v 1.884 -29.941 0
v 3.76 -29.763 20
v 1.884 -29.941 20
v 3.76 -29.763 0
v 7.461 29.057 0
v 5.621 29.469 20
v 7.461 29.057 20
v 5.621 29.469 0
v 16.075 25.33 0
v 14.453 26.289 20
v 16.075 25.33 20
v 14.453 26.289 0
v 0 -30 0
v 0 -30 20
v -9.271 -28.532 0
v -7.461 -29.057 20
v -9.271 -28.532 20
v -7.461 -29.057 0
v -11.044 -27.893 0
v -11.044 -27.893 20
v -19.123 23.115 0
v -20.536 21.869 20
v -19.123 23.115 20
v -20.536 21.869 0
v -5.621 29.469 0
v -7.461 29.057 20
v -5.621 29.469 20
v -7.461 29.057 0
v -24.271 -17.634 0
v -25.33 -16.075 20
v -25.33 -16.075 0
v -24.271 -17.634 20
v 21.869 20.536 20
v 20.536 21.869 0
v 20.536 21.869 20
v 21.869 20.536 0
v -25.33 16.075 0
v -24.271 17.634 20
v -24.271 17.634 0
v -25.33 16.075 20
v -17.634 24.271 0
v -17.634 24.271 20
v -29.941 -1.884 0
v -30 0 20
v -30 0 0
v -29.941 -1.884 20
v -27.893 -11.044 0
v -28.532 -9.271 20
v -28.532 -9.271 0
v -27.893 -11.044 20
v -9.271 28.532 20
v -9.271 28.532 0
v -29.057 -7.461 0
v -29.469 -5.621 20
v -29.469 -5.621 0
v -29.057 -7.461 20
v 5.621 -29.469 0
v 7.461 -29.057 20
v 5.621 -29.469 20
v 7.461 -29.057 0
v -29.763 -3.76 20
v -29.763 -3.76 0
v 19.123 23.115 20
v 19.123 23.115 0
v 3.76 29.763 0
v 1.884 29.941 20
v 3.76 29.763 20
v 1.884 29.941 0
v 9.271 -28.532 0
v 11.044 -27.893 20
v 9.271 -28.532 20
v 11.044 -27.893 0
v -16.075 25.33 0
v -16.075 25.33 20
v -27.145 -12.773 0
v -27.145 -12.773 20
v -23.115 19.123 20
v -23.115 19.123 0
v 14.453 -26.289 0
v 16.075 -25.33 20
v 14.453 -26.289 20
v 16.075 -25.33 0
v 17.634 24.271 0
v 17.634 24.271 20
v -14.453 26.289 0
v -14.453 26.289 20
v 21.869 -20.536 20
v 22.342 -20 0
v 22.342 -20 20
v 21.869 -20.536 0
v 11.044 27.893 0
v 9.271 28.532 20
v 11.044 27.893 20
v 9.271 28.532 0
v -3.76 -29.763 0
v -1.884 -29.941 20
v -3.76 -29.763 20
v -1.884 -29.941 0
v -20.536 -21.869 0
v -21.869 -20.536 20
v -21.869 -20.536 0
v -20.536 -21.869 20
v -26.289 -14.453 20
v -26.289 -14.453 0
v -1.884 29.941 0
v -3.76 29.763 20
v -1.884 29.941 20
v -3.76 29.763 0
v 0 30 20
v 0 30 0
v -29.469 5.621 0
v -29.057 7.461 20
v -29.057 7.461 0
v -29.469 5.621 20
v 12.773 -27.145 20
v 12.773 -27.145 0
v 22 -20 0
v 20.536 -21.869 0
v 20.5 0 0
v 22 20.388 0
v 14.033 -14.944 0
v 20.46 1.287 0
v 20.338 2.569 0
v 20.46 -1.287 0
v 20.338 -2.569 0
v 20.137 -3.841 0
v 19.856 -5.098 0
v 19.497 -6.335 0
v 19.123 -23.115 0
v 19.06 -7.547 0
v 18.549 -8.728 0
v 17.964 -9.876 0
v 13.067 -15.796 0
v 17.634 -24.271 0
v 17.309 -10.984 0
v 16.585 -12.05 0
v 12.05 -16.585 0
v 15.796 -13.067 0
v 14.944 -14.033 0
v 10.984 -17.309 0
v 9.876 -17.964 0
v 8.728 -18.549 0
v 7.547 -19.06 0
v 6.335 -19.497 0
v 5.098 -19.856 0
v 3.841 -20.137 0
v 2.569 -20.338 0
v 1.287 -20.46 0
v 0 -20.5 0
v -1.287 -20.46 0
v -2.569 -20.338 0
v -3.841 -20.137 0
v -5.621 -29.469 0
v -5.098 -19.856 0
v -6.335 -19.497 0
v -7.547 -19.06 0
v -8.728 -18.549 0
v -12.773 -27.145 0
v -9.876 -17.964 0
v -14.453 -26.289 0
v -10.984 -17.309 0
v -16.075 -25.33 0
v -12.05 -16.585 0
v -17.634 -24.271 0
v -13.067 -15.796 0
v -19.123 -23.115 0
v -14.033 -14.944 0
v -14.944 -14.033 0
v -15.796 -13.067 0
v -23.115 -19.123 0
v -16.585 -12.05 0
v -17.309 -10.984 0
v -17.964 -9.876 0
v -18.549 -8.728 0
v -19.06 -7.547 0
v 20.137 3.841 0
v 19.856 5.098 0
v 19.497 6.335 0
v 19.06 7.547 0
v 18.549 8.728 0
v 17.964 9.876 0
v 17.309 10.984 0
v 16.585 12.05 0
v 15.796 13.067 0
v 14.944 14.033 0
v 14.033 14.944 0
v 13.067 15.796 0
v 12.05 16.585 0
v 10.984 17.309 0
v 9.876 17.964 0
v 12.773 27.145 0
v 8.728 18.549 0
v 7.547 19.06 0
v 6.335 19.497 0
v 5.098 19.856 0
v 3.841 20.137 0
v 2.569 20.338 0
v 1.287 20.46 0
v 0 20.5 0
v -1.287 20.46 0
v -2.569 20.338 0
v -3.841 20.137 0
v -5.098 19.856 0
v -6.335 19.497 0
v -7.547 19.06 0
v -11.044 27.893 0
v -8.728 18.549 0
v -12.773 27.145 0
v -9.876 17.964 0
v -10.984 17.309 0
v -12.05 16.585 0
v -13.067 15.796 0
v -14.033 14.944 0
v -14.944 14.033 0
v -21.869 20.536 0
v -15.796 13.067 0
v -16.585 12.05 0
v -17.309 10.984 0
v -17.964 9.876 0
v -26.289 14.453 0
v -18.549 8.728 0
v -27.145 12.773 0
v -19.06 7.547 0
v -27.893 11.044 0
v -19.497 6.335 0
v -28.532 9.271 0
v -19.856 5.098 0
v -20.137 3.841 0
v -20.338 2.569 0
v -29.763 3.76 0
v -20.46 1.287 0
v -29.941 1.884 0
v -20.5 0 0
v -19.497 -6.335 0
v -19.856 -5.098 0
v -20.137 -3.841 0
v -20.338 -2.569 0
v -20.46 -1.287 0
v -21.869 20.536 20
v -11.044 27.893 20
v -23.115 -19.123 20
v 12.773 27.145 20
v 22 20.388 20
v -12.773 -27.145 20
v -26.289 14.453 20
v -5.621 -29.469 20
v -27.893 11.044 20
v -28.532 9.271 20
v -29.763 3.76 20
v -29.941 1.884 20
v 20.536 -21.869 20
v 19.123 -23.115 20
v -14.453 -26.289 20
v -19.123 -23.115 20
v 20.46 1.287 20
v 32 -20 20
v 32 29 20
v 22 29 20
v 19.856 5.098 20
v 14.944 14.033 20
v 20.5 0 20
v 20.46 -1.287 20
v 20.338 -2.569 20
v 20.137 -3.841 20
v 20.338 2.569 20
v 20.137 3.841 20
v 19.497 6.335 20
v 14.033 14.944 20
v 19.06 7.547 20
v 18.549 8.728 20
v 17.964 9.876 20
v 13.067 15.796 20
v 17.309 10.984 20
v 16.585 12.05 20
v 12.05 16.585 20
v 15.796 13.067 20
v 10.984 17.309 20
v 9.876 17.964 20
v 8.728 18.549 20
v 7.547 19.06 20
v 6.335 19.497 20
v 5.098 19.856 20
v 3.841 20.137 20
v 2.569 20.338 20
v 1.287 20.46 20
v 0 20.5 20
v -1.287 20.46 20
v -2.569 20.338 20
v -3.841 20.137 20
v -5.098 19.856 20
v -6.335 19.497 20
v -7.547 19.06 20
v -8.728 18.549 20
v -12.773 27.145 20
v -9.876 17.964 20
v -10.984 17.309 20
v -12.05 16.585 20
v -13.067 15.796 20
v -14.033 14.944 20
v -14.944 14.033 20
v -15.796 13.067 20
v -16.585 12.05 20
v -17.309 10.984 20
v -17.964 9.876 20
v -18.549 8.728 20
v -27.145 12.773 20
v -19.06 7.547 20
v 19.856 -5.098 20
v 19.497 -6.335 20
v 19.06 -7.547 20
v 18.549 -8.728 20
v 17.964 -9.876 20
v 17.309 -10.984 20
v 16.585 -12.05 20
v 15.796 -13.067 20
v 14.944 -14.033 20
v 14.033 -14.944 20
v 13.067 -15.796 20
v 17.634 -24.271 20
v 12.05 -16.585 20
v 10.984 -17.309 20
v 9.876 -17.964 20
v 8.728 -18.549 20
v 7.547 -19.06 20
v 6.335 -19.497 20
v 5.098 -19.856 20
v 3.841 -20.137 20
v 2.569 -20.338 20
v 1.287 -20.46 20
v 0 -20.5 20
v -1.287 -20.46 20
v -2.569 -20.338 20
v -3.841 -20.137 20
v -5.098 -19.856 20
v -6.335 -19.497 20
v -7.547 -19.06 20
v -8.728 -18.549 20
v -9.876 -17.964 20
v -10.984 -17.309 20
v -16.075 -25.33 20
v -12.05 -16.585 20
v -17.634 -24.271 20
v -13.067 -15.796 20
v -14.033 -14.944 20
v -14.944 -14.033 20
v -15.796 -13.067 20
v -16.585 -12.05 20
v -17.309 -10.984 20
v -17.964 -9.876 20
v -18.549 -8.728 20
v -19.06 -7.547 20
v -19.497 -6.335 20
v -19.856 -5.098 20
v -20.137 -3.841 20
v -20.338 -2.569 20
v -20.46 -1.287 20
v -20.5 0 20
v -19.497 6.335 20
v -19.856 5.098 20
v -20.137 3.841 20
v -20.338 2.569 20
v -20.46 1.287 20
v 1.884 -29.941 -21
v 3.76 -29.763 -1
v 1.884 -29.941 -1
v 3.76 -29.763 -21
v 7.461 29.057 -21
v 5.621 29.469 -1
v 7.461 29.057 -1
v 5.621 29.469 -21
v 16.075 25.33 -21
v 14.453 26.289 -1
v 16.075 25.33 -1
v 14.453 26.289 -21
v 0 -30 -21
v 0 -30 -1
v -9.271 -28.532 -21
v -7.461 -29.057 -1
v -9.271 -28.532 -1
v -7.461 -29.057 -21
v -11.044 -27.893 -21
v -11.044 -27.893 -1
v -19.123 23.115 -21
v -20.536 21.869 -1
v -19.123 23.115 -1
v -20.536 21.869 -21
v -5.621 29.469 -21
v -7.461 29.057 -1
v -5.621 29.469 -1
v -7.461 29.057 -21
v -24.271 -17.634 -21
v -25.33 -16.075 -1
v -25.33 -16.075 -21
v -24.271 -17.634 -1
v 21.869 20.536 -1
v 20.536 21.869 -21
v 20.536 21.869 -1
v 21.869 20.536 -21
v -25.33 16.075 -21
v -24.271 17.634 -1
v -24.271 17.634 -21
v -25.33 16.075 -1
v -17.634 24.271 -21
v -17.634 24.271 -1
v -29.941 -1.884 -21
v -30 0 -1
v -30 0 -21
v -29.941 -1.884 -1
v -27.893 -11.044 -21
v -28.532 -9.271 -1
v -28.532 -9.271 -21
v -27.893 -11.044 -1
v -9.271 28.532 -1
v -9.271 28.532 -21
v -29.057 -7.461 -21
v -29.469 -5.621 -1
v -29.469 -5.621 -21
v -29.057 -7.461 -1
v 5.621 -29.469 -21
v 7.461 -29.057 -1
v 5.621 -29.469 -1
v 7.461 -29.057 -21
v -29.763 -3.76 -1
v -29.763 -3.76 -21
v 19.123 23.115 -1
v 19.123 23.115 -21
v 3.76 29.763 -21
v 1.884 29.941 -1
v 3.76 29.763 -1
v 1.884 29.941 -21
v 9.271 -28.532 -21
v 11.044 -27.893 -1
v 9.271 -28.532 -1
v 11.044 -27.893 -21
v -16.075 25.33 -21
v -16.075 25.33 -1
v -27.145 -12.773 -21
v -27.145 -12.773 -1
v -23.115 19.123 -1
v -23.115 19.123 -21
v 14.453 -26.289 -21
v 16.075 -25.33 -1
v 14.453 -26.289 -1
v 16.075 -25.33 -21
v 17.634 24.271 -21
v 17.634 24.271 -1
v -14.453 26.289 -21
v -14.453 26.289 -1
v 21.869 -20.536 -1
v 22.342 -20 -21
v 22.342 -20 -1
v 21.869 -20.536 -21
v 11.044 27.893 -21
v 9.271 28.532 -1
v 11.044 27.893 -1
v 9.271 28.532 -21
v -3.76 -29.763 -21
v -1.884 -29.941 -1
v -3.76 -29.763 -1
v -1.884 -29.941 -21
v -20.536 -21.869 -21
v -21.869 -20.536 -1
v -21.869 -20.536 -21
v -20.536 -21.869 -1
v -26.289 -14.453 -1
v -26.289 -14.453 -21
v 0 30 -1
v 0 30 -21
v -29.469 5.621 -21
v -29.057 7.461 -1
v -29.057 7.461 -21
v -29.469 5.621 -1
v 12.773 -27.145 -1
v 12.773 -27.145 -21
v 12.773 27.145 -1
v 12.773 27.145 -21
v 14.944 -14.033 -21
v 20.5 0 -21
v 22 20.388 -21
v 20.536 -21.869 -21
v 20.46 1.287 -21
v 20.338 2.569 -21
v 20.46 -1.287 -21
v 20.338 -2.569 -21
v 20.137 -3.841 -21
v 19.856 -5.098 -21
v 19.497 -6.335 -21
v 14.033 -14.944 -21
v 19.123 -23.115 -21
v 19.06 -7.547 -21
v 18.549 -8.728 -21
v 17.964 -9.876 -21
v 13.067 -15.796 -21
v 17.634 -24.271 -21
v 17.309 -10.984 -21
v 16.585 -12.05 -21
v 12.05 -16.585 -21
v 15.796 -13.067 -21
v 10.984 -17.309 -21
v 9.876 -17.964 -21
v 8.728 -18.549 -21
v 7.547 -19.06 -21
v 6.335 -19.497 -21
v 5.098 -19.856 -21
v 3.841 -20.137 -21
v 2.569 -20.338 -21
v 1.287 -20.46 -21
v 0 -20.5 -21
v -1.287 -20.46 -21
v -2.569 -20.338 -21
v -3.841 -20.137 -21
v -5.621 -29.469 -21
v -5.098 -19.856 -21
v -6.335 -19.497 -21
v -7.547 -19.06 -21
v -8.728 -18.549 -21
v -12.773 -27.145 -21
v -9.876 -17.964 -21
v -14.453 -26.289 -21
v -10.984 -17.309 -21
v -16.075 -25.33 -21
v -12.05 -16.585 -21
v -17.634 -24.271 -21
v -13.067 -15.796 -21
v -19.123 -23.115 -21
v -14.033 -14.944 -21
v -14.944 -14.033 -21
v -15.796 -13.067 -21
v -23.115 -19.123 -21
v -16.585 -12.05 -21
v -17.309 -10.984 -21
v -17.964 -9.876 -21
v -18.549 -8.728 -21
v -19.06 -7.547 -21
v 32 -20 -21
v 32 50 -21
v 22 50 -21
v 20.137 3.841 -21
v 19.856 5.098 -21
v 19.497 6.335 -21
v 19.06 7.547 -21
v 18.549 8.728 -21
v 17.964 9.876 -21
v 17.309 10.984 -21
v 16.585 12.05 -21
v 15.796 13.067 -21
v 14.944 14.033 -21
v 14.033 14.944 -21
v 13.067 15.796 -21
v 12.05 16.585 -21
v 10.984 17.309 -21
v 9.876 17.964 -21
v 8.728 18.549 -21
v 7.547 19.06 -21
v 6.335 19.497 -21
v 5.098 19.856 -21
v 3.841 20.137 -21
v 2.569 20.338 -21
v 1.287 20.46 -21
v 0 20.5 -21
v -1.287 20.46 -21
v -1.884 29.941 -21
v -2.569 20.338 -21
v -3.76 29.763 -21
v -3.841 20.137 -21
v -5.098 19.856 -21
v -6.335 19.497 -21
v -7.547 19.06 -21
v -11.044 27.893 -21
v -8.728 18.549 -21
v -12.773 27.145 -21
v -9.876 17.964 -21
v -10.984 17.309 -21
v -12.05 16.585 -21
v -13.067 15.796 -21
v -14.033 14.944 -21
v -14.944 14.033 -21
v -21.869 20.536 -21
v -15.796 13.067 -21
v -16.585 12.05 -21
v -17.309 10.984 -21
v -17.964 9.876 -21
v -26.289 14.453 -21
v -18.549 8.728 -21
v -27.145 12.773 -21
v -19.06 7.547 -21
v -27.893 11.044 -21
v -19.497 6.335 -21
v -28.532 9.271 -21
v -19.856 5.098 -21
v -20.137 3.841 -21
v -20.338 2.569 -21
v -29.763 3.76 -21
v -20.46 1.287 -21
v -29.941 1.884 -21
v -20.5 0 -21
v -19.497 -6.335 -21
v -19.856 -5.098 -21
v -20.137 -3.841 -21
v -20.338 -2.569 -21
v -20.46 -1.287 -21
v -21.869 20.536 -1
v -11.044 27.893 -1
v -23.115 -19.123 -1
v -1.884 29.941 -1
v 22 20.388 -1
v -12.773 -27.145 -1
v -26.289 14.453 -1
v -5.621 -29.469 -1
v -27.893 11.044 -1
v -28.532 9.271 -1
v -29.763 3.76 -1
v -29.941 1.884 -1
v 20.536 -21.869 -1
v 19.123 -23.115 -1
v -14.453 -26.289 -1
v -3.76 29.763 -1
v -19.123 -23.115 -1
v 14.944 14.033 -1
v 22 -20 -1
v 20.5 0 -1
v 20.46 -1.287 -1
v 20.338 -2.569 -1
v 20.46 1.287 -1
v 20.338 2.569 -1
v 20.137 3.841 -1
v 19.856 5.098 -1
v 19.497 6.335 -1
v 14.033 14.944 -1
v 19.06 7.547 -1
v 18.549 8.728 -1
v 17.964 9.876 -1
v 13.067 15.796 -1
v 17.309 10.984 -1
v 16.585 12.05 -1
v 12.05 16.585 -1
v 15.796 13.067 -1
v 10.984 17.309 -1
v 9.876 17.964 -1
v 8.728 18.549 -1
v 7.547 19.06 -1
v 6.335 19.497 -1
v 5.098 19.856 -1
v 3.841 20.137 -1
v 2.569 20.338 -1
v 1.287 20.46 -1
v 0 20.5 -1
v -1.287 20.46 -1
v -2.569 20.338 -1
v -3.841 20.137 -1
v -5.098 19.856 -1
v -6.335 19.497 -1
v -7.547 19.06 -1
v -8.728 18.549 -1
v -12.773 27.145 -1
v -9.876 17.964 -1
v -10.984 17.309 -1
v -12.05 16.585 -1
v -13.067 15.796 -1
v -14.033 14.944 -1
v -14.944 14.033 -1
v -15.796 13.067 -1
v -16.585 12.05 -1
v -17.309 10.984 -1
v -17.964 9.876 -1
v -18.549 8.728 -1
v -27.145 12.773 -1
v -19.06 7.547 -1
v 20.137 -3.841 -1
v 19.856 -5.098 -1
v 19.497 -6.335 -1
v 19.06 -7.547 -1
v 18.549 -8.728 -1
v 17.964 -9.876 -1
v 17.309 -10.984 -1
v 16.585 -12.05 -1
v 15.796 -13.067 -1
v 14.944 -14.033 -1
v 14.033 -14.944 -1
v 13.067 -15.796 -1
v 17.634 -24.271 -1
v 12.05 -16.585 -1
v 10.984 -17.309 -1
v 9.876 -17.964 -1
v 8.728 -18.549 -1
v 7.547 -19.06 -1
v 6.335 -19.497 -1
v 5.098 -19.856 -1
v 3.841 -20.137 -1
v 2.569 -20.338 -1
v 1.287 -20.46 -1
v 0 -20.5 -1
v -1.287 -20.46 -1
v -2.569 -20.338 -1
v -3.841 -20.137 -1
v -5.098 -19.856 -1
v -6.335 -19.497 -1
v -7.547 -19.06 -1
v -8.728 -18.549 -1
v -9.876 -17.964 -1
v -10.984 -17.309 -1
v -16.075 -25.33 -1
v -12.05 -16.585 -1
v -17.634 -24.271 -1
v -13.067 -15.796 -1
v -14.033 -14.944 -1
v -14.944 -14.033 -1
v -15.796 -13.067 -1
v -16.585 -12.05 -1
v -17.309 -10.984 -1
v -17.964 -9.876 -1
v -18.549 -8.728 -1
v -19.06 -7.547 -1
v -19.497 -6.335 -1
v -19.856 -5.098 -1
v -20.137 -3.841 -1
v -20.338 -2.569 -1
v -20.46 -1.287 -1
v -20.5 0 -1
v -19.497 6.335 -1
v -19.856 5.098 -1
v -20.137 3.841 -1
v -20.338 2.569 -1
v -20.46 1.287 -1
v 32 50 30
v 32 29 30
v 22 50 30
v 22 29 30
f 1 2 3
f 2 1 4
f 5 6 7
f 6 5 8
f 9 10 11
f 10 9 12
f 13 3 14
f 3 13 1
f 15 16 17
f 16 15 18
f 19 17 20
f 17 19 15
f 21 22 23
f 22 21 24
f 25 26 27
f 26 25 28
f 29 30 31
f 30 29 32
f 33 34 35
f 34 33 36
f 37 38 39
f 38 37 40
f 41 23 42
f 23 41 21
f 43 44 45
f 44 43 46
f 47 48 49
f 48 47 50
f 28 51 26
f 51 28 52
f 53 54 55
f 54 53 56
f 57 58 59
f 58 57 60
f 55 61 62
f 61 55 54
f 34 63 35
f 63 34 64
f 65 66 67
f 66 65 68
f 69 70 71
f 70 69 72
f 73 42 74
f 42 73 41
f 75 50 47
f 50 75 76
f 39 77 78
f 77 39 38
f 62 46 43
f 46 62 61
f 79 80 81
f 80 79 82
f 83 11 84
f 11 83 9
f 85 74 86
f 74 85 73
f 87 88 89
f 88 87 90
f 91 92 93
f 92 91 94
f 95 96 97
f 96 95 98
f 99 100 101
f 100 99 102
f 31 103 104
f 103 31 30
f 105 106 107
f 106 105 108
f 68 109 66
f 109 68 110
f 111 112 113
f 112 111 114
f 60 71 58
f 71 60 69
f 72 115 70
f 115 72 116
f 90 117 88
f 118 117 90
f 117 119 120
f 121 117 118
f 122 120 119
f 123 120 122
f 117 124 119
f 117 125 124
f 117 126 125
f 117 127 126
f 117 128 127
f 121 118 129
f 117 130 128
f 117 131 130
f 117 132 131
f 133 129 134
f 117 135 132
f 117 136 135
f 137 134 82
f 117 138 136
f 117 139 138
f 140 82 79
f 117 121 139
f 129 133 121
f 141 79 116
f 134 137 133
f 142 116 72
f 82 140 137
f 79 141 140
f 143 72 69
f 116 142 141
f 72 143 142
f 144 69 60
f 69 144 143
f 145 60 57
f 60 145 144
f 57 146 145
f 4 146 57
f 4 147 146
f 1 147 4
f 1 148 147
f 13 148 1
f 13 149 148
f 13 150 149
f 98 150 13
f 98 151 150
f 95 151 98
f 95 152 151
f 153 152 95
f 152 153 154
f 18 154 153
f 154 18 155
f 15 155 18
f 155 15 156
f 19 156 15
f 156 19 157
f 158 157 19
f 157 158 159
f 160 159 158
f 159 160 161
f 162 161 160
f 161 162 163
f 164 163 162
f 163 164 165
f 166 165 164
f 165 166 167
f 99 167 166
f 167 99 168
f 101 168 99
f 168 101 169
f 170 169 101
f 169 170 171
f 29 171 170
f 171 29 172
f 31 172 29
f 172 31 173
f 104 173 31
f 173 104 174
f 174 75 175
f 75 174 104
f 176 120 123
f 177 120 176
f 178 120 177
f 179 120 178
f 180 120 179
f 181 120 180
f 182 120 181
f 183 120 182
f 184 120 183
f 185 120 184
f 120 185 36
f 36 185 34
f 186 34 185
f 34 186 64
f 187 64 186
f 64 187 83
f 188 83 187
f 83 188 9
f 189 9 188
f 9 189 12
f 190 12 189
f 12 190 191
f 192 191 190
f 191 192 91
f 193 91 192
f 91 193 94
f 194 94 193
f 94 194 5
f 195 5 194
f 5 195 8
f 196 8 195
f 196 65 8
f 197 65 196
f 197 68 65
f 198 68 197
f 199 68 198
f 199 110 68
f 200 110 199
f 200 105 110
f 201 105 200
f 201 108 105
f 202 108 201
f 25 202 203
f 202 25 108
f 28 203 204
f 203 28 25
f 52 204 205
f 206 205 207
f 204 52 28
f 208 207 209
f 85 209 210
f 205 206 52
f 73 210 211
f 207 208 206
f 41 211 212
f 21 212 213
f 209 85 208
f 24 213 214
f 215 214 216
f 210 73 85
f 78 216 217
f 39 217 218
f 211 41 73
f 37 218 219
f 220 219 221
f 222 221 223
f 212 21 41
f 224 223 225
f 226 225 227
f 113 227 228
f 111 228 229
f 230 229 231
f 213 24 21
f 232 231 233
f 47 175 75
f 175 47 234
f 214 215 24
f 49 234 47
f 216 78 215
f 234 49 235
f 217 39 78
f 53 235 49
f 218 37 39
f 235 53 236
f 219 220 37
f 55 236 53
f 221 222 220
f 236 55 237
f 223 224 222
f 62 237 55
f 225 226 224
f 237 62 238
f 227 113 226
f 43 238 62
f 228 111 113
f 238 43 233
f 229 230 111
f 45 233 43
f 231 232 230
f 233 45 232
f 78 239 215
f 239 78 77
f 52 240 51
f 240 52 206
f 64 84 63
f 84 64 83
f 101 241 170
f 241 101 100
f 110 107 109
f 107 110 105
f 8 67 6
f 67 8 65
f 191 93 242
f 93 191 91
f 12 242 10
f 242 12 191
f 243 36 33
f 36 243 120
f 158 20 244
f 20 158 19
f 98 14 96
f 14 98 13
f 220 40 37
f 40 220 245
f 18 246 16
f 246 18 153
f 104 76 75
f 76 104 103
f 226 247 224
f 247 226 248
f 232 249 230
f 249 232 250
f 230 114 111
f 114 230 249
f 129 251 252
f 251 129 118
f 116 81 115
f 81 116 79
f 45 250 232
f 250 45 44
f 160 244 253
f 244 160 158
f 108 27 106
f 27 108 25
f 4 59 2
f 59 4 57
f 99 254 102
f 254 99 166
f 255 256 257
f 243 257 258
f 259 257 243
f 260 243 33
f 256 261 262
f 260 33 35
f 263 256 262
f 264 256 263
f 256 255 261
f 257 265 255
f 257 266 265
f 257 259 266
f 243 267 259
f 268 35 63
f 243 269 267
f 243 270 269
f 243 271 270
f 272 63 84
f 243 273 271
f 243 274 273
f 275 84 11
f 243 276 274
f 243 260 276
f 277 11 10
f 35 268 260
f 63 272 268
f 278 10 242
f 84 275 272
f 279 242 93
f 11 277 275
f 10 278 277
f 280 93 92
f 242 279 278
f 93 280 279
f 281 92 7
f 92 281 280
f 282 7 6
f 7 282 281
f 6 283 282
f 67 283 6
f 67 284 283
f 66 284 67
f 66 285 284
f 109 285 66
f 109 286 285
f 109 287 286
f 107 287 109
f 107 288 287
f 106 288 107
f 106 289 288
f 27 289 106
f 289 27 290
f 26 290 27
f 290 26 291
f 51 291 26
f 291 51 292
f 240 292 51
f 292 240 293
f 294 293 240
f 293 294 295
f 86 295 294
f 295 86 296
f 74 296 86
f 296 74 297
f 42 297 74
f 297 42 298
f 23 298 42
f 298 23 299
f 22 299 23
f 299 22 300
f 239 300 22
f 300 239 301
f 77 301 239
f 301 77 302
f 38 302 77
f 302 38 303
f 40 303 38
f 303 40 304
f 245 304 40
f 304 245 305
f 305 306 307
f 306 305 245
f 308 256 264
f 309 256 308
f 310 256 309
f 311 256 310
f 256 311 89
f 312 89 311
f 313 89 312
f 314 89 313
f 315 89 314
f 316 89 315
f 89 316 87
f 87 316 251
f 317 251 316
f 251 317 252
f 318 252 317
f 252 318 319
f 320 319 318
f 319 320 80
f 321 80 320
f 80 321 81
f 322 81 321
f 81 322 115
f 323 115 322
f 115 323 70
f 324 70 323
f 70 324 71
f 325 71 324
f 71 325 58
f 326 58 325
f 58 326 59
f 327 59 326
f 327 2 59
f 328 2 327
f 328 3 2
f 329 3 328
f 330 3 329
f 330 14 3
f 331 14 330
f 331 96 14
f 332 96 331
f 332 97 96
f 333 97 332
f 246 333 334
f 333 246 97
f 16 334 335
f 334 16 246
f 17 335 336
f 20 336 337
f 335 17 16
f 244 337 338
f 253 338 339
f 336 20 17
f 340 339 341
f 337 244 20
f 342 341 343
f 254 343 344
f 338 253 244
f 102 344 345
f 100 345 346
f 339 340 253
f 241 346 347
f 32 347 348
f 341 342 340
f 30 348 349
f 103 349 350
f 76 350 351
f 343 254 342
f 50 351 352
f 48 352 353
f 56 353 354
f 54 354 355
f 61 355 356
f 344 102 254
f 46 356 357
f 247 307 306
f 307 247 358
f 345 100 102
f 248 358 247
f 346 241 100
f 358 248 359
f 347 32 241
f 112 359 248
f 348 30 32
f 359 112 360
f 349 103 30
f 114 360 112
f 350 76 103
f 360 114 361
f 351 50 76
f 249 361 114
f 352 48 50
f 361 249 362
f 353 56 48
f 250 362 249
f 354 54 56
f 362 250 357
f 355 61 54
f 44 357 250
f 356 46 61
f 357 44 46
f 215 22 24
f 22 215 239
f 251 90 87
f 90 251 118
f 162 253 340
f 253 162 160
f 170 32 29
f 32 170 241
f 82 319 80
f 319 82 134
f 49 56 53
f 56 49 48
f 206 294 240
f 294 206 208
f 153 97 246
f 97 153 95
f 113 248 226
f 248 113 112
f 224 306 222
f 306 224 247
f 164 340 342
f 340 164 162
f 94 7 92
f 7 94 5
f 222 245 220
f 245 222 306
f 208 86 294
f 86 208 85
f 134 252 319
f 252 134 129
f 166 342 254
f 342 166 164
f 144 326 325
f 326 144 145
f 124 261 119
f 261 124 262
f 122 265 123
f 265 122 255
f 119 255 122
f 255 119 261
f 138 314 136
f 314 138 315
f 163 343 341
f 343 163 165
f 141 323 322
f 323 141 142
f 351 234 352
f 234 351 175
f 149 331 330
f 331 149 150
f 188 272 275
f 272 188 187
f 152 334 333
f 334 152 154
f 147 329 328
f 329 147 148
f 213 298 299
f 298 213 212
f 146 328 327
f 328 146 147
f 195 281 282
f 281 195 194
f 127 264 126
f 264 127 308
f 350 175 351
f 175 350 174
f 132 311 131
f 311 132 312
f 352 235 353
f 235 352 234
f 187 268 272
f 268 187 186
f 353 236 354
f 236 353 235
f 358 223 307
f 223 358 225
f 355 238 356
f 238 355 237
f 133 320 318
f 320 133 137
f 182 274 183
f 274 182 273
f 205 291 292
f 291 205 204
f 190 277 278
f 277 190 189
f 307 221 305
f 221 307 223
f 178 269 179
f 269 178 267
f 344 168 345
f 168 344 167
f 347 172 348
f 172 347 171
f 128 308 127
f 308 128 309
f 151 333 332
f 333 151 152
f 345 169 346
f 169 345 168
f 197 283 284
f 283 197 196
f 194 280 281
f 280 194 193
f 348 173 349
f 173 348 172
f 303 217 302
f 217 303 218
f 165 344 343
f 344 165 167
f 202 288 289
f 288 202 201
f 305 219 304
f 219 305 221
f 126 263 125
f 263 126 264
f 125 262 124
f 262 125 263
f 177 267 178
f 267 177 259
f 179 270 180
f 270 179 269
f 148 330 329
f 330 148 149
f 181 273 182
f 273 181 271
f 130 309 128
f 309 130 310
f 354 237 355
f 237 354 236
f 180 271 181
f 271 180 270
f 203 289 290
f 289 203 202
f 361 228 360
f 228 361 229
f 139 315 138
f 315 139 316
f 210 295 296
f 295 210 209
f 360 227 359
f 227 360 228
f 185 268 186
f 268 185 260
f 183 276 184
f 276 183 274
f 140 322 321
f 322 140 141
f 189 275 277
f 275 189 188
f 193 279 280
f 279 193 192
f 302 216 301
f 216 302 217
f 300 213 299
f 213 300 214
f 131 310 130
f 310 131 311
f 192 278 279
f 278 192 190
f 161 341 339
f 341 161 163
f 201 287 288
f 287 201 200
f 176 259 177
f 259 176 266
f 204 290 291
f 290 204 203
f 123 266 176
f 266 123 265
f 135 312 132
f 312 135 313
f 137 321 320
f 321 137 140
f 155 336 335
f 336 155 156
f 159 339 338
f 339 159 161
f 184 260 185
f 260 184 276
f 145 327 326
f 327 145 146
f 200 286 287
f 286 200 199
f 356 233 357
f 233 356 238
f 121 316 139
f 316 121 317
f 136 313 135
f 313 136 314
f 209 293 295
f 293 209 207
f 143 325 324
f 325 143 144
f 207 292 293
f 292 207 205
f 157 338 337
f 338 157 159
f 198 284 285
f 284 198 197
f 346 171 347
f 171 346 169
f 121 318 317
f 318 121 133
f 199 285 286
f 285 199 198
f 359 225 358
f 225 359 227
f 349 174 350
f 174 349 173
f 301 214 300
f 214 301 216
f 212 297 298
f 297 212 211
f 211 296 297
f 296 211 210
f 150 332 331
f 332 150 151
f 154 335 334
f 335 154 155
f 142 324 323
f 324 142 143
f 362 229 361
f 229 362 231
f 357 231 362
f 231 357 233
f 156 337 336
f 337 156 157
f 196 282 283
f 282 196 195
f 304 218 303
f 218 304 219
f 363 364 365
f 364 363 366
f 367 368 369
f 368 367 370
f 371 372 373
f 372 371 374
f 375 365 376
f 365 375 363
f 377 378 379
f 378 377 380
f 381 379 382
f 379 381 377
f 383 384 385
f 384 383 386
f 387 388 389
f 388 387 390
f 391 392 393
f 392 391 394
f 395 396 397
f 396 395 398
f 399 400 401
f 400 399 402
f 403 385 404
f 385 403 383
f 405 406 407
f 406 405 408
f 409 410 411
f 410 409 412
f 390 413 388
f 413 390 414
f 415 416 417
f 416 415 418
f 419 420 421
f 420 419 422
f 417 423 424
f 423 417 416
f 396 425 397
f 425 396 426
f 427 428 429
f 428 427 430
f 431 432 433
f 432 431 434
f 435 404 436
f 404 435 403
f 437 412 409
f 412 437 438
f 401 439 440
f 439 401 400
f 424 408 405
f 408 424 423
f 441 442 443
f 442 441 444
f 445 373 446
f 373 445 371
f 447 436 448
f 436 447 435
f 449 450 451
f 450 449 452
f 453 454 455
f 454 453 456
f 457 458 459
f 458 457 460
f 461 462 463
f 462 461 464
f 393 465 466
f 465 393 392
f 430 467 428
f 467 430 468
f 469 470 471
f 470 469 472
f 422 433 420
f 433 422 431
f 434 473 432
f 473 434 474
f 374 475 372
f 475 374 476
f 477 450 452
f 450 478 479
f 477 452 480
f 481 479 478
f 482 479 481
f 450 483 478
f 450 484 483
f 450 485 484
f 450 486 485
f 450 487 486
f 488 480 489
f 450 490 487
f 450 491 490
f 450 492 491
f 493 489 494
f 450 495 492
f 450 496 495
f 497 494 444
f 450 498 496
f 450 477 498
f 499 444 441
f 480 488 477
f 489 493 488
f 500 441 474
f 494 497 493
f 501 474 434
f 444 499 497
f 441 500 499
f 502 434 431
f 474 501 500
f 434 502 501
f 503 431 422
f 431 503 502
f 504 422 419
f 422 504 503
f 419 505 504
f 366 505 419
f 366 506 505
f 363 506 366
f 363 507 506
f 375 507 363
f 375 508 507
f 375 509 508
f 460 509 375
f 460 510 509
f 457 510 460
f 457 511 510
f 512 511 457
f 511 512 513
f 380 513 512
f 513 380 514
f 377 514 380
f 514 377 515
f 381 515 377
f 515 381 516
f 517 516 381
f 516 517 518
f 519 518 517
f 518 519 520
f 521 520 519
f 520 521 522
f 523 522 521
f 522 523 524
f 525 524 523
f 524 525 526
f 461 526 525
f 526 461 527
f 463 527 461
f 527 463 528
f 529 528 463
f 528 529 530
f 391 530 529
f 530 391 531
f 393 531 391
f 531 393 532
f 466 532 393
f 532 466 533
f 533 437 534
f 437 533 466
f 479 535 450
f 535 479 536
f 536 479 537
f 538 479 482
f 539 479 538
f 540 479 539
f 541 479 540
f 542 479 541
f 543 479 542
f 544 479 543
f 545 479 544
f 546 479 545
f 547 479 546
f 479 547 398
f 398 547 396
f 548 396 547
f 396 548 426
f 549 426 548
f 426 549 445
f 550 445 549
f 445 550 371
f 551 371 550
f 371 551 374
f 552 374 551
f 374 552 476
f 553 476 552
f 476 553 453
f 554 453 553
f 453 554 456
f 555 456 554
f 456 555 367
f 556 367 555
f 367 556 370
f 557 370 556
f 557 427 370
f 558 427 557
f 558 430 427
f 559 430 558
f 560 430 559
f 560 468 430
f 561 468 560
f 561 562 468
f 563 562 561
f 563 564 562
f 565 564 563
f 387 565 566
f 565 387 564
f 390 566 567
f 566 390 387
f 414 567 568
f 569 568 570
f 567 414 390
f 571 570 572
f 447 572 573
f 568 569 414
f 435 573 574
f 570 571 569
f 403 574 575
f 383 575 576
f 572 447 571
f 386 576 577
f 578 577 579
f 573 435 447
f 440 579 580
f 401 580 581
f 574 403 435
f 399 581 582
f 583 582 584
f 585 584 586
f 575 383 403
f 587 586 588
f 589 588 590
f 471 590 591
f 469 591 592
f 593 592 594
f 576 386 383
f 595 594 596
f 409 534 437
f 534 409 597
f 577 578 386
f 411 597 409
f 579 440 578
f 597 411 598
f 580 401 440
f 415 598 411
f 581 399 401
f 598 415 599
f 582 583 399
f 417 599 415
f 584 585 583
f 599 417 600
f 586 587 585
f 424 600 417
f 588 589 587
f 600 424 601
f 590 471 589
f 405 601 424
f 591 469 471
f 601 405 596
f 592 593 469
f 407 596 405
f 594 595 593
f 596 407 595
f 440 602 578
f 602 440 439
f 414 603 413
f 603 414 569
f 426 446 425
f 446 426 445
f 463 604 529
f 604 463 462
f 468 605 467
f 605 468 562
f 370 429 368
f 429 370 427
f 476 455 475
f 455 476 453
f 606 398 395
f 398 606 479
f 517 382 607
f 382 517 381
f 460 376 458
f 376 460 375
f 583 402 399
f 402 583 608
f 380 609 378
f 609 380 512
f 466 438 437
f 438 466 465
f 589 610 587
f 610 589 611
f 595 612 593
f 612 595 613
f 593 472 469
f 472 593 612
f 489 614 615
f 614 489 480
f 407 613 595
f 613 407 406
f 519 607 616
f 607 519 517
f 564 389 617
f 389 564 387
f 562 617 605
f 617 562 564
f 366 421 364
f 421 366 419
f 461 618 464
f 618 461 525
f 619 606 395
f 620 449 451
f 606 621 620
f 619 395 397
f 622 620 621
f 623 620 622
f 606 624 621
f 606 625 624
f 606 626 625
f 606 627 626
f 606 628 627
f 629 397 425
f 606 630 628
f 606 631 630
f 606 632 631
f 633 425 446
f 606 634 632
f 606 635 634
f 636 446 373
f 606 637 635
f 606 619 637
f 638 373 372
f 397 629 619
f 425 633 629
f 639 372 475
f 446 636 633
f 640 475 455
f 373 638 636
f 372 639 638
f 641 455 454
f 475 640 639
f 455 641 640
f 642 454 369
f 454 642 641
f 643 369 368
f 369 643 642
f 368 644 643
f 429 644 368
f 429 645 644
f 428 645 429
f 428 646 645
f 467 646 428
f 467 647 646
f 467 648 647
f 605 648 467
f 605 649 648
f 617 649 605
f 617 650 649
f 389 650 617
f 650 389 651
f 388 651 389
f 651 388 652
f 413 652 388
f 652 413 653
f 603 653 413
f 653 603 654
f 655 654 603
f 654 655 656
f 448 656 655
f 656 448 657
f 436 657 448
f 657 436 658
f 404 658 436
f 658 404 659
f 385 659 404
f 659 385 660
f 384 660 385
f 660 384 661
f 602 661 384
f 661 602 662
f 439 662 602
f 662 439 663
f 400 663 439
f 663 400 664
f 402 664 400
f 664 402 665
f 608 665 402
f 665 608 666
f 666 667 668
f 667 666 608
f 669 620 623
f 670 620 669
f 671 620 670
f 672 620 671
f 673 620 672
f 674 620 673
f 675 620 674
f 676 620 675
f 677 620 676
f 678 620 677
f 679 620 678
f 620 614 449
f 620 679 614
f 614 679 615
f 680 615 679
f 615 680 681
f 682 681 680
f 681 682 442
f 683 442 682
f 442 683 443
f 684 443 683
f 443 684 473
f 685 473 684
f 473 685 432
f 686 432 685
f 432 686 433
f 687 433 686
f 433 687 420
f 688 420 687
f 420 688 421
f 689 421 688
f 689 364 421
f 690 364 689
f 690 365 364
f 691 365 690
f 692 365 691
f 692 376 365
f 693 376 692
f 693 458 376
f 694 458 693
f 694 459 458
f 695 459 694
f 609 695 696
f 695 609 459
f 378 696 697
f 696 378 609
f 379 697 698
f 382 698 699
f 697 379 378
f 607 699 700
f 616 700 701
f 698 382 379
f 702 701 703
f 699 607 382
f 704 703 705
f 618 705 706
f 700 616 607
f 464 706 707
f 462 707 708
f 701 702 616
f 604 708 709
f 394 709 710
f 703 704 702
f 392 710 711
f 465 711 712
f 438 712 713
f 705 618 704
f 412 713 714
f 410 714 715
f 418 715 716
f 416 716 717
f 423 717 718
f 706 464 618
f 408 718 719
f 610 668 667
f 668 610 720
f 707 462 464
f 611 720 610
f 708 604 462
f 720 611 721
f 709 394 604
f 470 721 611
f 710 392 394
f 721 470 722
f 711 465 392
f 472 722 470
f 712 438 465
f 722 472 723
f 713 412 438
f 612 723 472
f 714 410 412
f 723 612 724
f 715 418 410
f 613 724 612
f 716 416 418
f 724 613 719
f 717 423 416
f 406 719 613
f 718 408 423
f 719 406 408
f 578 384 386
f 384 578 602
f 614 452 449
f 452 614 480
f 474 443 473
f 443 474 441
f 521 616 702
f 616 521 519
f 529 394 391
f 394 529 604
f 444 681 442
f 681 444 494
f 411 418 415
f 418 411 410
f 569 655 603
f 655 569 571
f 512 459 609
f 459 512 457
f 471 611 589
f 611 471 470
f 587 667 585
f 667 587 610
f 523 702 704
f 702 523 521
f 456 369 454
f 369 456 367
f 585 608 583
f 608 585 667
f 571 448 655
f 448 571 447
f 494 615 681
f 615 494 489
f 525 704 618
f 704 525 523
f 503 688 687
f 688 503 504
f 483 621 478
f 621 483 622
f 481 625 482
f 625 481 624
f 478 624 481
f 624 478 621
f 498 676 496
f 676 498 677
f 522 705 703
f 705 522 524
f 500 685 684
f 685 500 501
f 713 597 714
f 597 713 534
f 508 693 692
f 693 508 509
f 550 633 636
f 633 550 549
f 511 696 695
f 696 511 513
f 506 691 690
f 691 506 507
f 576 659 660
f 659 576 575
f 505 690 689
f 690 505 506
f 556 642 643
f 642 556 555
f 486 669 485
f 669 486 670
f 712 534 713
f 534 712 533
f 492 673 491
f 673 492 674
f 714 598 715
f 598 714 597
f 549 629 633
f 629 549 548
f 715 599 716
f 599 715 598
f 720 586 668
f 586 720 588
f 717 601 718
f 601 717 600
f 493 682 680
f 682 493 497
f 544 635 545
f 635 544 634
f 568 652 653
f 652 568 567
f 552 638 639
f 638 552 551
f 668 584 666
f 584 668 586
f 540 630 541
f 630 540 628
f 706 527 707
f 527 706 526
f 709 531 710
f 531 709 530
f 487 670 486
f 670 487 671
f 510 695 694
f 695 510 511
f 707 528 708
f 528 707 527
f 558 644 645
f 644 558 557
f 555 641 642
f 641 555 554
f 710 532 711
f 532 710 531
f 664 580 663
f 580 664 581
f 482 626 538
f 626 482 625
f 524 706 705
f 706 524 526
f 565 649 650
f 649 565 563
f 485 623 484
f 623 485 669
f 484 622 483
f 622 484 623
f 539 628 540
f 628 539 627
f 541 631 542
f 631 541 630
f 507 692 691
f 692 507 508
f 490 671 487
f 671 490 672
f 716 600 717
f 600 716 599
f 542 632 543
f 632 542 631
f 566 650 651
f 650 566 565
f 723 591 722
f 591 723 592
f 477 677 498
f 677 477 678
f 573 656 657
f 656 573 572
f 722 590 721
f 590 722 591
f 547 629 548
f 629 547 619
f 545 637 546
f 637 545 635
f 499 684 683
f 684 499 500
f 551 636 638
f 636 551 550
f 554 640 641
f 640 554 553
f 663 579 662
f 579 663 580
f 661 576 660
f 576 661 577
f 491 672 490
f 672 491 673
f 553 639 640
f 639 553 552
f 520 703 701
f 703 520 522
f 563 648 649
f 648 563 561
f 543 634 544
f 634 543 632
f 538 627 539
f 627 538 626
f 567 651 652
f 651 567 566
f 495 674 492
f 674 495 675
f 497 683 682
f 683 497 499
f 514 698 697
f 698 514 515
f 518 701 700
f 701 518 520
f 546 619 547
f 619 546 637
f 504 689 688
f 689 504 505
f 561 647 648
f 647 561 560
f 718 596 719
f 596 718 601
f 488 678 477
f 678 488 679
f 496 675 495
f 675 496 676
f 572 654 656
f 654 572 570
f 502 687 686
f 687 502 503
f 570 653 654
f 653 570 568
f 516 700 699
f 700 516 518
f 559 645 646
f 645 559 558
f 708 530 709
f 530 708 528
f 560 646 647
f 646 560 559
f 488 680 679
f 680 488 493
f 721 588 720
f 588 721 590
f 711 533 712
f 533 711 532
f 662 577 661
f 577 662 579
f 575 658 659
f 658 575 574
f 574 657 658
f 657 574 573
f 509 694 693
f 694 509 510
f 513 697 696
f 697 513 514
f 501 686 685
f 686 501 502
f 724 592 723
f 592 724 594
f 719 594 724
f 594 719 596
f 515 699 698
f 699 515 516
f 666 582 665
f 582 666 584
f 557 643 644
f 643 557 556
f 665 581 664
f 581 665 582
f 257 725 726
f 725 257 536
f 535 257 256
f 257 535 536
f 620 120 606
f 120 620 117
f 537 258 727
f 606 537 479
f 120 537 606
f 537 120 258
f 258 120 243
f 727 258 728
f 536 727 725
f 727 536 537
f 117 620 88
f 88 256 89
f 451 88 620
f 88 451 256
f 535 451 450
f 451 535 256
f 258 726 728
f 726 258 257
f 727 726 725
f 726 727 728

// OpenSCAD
d4 = 6.0;
h4 = 60.0;

$fn=100;

difference (){

    cylinder(r = 30, h = 20);
    cylinder(r = 20.5, h = 20);  
}   

difference (){
      translate([0,0,-20-1]) cylinder(r = 30, h = 20);
      translate([0,0,-20-1]) cylinder(r = 20.5, h = 20);  
}

difference () {
      translate([22,-20,-21]) cube([10,70,41]); 
}

translate([22,29,30]) rotate([-90,0,0]) cube([10,30,21]);
